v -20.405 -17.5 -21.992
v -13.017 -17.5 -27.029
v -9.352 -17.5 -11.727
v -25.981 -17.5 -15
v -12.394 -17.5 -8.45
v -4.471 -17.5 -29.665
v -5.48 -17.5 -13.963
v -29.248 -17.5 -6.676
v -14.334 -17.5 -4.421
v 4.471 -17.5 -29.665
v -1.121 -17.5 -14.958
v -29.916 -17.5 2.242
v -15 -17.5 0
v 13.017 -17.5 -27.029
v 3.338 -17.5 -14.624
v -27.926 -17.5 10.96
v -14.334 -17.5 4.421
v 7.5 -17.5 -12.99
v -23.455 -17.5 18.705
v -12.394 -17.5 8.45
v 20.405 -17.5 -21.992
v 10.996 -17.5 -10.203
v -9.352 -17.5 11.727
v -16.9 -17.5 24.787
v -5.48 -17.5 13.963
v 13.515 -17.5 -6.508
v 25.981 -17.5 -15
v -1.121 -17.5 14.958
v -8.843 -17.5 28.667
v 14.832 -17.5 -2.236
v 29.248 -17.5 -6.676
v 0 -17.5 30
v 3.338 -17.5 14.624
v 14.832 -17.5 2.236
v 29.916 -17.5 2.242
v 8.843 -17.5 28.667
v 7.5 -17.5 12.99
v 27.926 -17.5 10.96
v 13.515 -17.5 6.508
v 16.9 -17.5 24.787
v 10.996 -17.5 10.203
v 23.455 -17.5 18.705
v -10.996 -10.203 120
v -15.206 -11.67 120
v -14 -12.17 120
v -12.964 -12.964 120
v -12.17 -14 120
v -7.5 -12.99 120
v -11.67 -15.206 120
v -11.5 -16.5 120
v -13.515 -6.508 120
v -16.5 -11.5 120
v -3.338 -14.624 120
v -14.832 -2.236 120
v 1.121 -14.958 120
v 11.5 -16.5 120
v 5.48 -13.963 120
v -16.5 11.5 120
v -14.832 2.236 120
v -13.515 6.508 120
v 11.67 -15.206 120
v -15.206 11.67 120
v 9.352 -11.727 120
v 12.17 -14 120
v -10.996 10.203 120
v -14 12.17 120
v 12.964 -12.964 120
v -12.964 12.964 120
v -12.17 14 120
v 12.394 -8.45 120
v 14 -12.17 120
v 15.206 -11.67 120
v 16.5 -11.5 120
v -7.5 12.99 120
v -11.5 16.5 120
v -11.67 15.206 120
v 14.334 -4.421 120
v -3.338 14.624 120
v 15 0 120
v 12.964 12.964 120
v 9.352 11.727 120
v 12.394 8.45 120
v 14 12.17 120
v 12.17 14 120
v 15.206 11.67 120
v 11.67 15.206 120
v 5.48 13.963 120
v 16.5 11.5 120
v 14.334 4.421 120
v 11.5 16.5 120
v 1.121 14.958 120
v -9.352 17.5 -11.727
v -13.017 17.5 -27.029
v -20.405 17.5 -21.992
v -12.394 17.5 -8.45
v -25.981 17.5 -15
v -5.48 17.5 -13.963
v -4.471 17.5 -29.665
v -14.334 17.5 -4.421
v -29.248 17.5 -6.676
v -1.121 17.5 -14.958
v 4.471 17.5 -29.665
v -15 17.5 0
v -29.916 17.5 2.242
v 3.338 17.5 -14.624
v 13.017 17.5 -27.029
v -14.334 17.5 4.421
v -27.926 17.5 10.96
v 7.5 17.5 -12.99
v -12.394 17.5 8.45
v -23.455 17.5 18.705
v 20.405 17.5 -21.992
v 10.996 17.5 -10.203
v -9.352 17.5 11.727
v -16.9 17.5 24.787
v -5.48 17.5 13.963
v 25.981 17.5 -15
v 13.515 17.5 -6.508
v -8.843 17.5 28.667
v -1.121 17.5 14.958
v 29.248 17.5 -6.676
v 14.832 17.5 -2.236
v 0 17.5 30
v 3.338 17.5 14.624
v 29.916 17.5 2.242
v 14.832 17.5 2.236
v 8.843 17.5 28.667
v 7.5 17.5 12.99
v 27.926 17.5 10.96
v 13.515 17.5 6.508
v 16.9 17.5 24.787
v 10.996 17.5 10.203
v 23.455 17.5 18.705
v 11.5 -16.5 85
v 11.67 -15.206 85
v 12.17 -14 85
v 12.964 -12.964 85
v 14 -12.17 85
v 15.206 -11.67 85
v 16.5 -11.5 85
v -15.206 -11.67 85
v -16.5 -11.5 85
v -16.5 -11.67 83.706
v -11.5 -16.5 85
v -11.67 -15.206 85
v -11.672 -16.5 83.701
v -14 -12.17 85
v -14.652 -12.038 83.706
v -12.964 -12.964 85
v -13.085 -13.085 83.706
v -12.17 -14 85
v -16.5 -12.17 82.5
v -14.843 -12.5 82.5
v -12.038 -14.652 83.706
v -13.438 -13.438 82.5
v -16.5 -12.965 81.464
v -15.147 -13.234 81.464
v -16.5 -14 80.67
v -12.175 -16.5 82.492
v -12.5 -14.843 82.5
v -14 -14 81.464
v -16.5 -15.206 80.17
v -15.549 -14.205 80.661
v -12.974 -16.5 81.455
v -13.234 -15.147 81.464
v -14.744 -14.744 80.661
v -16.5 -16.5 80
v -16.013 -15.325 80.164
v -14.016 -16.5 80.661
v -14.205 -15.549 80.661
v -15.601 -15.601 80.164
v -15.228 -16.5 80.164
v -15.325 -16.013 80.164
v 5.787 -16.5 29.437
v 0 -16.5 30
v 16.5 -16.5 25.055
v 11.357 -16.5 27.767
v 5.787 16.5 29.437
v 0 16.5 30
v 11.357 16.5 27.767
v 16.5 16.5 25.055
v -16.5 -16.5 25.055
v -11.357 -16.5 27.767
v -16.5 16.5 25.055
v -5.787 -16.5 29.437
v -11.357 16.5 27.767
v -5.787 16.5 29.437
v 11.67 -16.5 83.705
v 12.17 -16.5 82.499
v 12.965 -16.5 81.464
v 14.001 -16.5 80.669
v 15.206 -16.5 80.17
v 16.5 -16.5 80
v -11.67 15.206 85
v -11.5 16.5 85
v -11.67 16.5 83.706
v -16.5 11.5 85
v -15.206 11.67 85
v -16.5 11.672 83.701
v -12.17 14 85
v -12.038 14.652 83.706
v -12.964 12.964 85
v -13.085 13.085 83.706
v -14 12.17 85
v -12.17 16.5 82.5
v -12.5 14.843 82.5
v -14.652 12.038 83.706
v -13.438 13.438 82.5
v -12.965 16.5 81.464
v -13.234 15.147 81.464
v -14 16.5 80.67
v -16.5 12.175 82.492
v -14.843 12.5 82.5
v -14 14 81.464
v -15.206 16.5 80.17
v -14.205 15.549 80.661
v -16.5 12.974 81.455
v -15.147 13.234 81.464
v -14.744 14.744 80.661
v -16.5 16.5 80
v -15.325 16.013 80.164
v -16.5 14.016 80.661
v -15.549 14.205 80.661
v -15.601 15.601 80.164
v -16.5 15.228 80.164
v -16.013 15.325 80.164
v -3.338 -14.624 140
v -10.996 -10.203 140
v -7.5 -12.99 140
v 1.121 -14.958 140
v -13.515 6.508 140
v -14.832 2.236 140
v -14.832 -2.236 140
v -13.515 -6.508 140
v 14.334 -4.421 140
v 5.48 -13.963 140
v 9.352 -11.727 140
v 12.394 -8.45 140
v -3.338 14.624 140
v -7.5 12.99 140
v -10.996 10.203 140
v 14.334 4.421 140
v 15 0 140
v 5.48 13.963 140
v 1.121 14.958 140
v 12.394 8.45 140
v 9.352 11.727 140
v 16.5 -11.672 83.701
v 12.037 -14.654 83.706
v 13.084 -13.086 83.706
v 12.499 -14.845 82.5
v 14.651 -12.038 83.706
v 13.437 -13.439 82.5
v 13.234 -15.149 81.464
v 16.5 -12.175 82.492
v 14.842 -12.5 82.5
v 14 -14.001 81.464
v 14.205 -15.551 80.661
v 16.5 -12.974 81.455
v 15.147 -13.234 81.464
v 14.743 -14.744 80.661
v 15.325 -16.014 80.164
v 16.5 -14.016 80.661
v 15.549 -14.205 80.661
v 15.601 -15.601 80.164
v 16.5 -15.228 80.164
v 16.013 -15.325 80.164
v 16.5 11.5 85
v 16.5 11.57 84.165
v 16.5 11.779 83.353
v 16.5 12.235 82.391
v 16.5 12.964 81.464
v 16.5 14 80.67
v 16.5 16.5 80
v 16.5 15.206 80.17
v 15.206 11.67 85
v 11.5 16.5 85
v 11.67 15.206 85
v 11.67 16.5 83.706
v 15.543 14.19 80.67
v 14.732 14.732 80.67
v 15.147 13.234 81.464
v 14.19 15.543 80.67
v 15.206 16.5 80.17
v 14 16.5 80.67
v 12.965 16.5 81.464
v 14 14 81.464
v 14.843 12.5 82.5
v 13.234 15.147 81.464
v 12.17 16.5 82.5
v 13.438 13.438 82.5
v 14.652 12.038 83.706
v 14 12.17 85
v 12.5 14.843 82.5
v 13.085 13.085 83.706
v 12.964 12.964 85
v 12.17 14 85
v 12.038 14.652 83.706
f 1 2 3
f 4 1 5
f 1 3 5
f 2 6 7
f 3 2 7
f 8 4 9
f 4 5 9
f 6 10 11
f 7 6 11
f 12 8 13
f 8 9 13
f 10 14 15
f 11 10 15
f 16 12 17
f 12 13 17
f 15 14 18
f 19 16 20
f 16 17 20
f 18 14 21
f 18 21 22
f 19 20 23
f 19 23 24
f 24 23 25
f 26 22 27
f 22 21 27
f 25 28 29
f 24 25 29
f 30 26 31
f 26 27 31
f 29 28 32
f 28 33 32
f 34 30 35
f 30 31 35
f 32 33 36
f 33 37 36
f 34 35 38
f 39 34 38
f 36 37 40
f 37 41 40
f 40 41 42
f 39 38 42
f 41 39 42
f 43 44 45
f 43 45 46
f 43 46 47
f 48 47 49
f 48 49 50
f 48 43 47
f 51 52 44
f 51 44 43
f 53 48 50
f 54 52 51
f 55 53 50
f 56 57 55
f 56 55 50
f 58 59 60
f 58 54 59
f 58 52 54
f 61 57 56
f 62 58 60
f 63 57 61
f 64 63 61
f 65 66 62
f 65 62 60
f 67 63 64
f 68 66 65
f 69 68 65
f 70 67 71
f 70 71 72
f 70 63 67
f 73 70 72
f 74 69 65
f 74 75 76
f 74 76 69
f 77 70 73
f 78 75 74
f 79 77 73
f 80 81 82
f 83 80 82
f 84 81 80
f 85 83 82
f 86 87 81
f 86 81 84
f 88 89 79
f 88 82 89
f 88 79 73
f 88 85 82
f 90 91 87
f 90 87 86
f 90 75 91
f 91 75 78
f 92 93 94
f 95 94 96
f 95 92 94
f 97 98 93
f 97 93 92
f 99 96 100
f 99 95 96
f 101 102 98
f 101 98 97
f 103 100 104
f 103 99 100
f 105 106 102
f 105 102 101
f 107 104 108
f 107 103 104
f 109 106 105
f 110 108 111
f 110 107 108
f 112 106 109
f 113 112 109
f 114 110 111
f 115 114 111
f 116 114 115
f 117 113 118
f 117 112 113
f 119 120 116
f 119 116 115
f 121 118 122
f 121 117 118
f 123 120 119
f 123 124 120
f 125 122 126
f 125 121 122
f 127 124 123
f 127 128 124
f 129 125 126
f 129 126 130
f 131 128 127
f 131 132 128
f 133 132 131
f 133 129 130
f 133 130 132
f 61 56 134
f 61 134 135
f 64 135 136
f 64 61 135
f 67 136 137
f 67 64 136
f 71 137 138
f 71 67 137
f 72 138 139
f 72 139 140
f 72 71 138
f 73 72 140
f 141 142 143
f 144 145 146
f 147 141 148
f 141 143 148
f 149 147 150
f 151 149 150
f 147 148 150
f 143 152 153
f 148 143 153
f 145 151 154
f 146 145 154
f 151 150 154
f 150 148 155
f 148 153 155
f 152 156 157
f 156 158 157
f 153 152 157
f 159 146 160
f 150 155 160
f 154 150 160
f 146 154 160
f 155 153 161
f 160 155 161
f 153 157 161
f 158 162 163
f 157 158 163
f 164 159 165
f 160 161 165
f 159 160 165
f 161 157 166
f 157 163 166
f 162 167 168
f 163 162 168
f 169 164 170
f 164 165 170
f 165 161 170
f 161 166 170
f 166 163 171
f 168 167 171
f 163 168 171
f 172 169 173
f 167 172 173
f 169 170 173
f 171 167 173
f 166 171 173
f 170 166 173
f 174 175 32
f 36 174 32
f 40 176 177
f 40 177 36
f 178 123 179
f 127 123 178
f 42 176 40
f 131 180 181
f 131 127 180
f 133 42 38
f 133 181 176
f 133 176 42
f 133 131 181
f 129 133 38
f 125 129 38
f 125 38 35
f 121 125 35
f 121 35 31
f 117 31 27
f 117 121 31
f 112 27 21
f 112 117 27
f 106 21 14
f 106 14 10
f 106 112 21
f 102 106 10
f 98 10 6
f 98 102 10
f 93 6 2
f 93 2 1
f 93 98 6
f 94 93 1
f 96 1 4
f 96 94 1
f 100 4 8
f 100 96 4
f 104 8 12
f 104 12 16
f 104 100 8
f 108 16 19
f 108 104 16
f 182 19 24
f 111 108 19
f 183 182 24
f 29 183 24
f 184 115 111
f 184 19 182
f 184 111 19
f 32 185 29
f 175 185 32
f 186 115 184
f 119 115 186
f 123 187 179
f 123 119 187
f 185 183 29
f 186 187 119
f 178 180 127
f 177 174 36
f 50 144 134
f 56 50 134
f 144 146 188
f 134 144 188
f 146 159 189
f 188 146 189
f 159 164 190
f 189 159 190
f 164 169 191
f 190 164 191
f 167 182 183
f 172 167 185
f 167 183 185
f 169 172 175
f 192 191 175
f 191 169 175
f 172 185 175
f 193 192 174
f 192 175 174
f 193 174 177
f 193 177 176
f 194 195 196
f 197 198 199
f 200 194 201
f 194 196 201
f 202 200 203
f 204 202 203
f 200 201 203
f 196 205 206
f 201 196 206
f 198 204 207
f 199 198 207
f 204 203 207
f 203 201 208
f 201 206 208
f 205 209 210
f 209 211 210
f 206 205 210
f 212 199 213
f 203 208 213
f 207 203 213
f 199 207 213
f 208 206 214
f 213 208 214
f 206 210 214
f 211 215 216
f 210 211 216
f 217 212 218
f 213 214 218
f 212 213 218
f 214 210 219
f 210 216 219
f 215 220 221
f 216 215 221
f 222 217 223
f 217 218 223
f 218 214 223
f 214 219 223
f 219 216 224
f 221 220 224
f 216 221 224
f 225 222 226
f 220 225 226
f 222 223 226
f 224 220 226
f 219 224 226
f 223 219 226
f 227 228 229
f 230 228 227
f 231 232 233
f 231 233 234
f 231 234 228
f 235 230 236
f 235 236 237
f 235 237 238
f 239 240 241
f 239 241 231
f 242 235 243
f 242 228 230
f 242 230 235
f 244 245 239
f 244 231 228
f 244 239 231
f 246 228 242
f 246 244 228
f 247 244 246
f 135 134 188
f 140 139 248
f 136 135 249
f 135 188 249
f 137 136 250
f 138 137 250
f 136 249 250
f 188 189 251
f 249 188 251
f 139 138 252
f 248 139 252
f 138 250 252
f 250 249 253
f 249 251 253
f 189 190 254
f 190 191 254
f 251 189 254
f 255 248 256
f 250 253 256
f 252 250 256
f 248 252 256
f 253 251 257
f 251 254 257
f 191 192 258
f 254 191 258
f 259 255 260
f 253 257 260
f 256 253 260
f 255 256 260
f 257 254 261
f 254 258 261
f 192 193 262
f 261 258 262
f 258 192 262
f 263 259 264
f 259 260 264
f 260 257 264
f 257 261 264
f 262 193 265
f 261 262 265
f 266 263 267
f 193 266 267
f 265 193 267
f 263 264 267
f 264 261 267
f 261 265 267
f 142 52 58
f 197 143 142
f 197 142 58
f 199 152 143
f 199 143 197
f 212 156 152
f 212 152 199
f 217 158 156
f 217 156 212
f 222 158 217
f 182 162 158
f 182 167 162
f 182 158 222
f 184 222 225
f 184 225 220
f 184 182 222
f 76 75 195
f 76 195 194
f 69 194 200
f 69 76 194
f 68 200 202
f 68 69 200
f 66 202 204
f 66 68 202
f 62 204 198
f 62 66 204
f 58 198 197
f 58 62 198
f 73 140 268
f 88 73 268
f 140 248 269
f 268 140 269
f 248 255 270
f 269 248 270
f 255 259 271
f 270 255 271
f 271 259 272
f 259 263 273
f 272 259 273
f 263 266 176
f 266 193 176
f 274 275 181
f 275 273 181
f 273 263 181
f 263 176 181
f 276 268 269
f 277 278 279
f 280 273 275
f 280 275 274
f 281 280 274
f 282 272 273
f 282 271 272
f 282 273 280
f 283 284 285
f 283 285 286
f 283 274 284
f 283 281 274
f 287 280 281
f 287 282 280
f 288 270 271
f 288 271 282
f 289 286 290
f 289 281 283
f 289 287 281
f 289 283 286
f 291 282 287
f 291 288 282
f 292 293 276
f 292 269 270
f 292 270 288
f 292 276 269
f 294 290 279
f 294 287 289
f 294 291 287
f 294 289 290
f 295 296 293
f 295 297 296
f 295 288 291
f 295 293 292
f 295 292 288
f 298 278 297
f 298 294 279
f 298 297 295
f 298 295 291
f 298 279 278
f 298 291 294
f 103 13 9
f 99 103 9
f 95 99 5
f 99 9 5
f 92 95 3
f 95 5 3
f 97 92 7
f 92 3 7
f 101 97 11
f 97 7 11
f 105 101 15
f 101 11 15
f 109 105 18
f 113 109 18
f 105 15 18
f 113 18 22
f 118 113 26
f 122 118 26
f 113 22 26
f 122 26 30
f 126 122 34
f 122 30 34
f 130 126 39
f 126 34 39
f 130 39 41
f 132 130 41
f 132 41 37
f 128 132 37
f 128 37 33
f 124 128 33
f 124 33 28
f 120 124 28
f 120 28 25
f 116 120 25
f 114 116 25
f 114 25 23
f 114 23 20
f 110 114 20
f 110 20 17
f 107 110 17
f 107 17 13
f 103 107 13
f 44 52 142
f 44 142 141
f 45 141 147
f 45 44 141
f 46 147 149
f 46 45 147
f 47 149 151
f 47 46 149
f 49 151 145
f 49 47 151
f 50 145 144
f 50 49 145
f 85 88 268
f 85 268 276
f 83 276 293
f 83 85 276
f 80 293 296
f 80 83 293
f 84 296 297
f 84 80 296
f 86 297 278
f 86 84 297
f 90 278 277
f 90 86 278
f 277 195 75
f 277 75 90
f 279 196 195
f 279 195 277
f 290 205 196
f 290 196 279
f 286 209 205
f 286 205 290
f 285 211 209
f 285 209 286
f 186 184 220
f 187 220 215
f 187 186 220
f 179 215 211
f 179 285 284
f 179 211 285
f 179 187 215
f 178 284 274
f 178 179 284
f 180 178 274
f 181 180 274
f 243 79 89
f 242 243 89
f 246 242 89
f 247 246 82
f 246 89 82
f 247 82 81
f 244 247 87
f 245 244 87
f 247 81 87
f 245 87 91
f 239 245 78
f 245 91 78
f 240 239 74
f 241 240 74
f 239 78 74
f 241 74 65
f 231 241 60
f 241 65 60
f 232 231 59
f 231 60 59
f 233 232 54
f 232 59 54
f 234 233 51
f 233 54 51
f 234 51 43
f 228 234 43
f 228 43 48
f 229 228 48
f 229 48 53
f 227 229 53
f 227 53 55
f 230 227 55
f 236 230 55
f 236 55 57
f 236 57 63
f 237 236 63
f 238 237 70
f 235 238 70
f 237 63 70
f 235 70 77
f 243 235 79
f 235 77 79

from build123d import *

# Parameters (mm, degrees)
SKETCH1_R                = 30
BOSS_EXTRUDE1_DEPTH      = 17.5
SKETCH2_W                = 33
SKETCH2_H                = 33
BOSS_EXTRUDE2_DEPTH      = 120
SKETCH3_R                = 15
BOSS_EXTRUDE3_DEPTH      = 20
HOLE1_D                  = 30
CUT_EXTRUDE1_DEPTH       = 40
FILLET1_R                = 5
CIRPATTERN1_COUNT        = 4
FILLET1_OF_CIRPATTERN1_R = 5


with BuildPart() as part:
    # Sketch1 → Boss-Extrude1 (new, symmetric)
    with BuildSketch(Plane(origin=(0, 0, 0), x_dir=(1, 0, 0), z_dir=(0, 1, 0))):
        with Locations(Location((0, 0, 0), (0, 0, 270))):
            Circle(SKETCH1_R)
    extrude(amount=BOSS_EXTRUDE1_DEPTH, both=True)

    # Sketch2 → Boss-Extrude2 (add)
    with BuildSketch(Plane.XY):
        Rectangle(SKETCH2_W, SKETCH2_H)
    extrude(amount=BOSS_EXTRUDE2_DEPTH)

    # Sketch3 → Boss-Extrude3 (add)
    with BuildSketch(Plane.XY.offset(120)):
        Circle(SKETCH3_R)
    extrude(amount=BOSS_EXTRUDE3_DEPTH)

    # Hole1 (through all)
    with Locations(Plane(origin=(0, 17.5, 0), x_dir=(1, 0, 0), z_dir=(0, 1, 0))):
        with Locations((0, 0)):
            Hole(HOLE1_D / 2)

    # Sketch6 → Cut-Extrude1 (cut)
    with BuildSketch(Plane.XY.offset(120)):
        with BuildLine():
            Line((11.5, 16.5), (16.5, 16.5))
            Line((16.5, 16.5), (16.5, 11.5))
            ThreePointArc((16.5, 11.5), (12.964466094, 12.964466094), (11.5, 16.5))
        make_face()
    cut_extrude1 = extrude(amount=-CUT_EXTRUDE1_DEPTH, mode=Mode.SUBTRACT)

    # Fillet1
    fillet1_edges = [part.edges().sort_by_distance(p)[0] for p in [
        (12.964466094, 12.964466094, 80),
    ]]
    fillet(fillet1_edges, radius=FILLET1_R - 0.0001)  # a hair under: the kernel refuses the full size

    # CirPattern1: Cut-Extrude1 ×4 about axis
    cirpattern1_axis = Axis((0, 0, 0), (0, 0, 1))
    for i in range(1, CIRPATTERN1_COUNT):
        add(cut_extrude1.rotate(cirpattern1_axis, i * 360 / CIRPATTERN1_COUNT), mode=Mode.SUBTRACT)

    # Fillet1 of CirPattern1
    fillet1_of_cirpattern1_edges = [part.edges().sort_by_distance(p)[0] for p in [
        (-12.964466094, 12.964466094, 80),
        (-12.964466094, -12.964466094, 80),
        (12.964466094, -12.964466094, 80),
    ]]
    fillet(fillet1_of_cirpattern1_edges, radius=FILLET1_OF_CIRPATTERN1_R - 0.0001)  # a hair under: the kernel refuses the full size


solid = part.part
